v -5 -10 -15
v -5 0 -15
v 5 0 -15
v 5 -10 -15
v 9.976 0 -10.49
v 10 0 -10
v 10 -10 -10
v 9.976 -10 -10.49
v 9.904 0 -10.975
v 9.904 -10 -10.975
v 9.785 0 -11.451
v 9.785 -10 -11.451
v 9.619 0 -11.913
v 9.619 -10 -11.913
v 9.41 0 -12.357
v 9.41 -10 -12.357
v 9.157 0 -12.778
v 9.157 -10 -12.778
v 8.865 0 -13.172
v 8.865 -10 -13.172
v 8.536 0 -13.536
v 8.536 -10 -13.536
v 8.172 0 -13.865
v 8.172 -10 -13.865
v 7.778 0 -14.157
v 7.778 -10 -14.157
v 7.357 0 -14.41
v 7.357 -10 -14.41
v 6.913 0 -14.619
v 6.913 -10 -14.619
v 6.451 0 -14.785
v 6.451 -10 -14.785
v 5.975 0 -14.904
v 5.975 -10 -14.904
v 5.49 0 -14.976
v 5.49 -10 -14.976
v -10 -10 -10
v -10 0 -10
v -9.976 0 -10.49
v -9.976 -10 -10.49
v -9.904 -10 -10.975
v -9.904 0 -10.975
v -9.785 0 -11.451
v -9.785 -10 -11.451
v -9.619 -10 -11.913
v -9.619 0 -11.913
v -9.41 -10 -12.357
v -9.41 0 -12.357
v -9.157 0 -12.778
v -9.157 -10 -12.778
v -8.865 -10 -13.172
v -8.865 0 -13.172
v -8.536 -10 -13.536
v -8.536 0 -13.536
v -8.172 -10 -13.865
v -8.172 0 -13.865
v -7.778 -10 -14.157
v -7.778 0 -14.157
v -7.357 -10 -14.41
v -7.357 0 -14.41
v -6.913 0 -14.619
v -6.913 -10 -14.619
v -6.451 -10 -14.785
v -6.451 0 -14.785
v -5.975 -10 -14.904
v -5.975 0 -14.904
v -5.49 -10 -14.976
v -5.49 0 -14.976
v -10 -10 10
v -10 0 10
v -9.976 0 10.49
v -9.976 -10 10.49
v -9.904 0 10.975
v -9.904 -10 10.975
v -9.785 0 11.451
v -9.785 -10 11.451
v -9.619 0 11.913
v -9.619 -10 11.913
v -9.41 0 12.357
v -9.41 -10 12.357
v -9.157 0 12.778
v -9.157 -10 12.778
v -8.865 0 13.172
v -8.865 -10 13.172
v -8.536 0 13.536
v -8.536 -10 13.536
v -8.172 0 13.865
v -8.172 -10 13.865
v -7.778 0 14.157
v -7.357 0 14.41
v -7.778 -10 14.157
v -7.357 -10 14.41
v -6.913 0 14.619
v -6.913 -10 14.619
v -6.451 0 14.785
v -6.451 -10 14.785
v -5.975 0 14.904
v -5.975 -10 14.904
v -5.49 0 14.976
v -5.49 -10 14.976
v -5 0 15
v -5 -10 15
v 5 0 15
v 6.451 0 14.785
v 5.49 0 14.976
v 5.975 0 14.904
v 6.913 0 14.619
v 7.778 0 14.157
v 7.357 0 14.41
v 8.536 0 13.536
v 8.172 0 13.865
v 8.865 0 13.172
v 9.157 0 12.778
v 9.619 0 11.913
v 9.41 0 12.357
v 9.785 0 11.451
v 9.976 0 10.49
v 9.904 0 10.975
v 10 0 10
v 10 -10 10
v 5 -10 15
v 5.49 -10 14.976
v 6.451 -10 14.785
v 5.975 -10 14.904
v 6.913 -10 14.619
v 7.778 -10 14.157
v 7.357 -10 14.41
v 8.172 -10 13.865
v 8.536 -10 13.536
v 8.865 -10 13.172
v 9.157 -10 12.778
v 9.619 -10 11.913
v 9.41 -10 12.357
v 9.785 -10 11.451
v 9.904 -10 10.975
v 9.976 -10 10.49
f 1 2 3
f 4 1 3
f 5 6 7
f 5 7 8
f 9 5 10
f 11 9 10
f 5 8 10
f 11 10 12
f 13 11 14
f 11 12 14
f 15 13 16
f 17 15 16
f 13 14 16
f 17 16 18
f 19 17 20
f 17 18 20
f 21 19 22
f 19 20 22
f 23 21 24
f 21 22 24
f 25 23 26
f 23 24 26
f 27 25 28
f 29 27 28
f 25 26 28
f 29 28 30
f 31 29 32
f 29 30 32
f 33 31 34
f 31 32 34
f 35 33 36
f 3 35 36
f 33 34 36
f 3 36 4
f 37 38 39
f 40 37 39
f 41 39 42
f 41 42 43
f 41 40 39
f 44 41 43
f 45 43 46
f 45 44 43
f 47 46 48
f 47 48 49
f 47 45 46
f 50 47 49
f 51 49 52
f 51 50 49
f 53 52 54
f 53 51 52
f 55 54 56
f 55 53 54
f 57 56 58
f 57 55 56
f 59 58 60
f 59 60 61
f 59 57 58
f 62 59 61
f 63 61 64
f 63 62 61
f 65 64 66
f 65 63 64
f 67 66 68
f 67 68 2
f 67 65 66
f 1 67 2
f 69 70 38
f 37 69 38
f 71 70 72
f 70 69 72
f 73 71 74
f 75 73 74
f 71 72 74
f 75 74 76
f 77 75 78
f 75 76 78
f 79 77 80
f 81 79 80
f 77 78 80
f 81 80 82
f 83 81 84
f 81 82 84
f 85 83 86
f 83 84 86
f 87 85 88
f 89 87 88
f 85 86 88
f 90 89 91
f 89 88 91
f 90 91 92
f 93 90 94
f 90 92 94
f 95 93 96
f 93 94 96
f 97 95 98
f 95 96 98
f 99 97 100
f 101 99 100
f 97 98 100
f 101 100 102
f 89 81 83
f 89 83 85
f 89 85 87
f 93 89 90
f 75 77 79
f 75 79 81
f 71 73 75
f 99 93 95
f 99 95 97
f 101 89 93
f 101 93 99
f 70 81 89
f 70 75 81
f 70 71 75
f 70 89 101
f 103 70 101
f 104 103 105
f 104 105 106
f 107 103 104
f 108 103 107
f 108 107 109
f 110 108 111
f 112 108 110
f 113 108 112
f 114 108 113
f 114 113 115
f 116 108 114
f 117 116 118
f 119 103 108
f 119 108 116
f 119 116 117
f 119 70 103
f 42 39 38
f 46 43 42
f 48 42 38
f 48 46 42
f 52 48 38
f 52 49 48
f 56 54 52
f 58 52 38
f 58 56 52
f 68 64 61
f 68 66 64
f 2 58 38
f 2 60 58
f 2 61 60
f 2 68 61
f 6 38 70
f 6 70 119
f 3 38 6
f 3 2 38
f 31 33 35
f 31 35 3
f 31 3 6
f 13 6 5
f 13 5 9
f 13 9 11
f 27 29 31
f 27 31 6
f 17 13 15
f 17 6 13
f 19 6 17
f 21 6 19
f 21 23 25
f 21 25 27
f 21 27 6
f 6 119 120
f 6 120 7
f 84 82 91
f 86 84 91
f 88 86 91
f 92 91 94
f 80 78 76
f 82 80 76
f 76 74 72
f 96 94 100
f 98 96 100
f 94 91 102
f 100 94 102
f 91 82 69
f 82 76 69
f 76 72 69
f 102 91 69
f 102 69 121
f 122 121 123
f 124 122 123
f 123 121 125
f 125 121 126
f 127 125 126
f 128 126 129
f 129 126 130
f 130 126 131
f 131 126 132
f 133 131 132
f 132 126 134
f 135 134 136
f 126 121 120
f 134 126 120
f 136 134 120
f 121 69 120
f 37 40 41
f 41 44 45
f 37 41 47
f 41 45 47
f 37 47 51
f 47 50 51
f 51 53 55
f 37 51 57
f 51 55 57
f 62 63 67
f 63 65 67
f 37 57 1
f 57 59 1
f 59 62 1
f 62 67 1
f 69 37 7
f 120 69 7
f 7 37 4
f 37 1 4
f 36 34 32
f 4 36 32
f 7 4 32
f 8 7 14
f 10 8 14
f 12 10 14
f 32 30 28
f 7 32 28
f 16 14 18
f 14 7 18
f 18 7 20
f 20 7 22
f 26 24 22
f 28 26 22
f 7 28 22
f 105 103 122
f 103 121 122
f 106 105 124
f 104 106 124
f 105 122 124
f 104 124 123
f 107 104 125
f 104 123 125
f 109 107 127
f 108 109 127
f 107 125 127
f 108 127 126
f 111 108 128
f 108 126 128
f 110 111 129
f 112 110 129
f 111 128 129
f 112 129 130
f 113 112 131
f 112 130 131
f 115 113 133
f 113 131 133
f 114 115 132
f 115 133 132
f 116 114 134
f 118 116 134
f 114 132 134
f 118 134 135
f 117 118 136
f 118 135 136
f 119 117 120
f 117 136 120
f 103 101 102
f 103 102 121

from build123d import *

# Parameters (mm, degrees)
SKETCH2_W           = 20
SKETCH2_H           = 30
BOSS_EXTRUDE1_DEPTH = 10
FILLET1_R           = 5


with BuildPart() as part:
    # Sketch2 → Boss-Extrude1 (new body)
    with BuildSketch(Plane(origin=(0, 0, 0), x_dir=(1, 0, 0), z_dir=(0, 1, 0))):
        Rectangle(SKETCH2_W, SKETCH2_H)
    extrude(amount=-BOSS_EXTRUDE1_DEPTH)

    # Fillet1
    fillet1_edges = [part.edges().sort_by_distance(p)[0] for p in [
        (10, -5, 15),
        (-10, -5, 15),
        (-10, -5, -15),
        (10, -5, -15),
    ]]
    fillet(fillet1_edges, radius=FILLET1_R)


solid = part.part
